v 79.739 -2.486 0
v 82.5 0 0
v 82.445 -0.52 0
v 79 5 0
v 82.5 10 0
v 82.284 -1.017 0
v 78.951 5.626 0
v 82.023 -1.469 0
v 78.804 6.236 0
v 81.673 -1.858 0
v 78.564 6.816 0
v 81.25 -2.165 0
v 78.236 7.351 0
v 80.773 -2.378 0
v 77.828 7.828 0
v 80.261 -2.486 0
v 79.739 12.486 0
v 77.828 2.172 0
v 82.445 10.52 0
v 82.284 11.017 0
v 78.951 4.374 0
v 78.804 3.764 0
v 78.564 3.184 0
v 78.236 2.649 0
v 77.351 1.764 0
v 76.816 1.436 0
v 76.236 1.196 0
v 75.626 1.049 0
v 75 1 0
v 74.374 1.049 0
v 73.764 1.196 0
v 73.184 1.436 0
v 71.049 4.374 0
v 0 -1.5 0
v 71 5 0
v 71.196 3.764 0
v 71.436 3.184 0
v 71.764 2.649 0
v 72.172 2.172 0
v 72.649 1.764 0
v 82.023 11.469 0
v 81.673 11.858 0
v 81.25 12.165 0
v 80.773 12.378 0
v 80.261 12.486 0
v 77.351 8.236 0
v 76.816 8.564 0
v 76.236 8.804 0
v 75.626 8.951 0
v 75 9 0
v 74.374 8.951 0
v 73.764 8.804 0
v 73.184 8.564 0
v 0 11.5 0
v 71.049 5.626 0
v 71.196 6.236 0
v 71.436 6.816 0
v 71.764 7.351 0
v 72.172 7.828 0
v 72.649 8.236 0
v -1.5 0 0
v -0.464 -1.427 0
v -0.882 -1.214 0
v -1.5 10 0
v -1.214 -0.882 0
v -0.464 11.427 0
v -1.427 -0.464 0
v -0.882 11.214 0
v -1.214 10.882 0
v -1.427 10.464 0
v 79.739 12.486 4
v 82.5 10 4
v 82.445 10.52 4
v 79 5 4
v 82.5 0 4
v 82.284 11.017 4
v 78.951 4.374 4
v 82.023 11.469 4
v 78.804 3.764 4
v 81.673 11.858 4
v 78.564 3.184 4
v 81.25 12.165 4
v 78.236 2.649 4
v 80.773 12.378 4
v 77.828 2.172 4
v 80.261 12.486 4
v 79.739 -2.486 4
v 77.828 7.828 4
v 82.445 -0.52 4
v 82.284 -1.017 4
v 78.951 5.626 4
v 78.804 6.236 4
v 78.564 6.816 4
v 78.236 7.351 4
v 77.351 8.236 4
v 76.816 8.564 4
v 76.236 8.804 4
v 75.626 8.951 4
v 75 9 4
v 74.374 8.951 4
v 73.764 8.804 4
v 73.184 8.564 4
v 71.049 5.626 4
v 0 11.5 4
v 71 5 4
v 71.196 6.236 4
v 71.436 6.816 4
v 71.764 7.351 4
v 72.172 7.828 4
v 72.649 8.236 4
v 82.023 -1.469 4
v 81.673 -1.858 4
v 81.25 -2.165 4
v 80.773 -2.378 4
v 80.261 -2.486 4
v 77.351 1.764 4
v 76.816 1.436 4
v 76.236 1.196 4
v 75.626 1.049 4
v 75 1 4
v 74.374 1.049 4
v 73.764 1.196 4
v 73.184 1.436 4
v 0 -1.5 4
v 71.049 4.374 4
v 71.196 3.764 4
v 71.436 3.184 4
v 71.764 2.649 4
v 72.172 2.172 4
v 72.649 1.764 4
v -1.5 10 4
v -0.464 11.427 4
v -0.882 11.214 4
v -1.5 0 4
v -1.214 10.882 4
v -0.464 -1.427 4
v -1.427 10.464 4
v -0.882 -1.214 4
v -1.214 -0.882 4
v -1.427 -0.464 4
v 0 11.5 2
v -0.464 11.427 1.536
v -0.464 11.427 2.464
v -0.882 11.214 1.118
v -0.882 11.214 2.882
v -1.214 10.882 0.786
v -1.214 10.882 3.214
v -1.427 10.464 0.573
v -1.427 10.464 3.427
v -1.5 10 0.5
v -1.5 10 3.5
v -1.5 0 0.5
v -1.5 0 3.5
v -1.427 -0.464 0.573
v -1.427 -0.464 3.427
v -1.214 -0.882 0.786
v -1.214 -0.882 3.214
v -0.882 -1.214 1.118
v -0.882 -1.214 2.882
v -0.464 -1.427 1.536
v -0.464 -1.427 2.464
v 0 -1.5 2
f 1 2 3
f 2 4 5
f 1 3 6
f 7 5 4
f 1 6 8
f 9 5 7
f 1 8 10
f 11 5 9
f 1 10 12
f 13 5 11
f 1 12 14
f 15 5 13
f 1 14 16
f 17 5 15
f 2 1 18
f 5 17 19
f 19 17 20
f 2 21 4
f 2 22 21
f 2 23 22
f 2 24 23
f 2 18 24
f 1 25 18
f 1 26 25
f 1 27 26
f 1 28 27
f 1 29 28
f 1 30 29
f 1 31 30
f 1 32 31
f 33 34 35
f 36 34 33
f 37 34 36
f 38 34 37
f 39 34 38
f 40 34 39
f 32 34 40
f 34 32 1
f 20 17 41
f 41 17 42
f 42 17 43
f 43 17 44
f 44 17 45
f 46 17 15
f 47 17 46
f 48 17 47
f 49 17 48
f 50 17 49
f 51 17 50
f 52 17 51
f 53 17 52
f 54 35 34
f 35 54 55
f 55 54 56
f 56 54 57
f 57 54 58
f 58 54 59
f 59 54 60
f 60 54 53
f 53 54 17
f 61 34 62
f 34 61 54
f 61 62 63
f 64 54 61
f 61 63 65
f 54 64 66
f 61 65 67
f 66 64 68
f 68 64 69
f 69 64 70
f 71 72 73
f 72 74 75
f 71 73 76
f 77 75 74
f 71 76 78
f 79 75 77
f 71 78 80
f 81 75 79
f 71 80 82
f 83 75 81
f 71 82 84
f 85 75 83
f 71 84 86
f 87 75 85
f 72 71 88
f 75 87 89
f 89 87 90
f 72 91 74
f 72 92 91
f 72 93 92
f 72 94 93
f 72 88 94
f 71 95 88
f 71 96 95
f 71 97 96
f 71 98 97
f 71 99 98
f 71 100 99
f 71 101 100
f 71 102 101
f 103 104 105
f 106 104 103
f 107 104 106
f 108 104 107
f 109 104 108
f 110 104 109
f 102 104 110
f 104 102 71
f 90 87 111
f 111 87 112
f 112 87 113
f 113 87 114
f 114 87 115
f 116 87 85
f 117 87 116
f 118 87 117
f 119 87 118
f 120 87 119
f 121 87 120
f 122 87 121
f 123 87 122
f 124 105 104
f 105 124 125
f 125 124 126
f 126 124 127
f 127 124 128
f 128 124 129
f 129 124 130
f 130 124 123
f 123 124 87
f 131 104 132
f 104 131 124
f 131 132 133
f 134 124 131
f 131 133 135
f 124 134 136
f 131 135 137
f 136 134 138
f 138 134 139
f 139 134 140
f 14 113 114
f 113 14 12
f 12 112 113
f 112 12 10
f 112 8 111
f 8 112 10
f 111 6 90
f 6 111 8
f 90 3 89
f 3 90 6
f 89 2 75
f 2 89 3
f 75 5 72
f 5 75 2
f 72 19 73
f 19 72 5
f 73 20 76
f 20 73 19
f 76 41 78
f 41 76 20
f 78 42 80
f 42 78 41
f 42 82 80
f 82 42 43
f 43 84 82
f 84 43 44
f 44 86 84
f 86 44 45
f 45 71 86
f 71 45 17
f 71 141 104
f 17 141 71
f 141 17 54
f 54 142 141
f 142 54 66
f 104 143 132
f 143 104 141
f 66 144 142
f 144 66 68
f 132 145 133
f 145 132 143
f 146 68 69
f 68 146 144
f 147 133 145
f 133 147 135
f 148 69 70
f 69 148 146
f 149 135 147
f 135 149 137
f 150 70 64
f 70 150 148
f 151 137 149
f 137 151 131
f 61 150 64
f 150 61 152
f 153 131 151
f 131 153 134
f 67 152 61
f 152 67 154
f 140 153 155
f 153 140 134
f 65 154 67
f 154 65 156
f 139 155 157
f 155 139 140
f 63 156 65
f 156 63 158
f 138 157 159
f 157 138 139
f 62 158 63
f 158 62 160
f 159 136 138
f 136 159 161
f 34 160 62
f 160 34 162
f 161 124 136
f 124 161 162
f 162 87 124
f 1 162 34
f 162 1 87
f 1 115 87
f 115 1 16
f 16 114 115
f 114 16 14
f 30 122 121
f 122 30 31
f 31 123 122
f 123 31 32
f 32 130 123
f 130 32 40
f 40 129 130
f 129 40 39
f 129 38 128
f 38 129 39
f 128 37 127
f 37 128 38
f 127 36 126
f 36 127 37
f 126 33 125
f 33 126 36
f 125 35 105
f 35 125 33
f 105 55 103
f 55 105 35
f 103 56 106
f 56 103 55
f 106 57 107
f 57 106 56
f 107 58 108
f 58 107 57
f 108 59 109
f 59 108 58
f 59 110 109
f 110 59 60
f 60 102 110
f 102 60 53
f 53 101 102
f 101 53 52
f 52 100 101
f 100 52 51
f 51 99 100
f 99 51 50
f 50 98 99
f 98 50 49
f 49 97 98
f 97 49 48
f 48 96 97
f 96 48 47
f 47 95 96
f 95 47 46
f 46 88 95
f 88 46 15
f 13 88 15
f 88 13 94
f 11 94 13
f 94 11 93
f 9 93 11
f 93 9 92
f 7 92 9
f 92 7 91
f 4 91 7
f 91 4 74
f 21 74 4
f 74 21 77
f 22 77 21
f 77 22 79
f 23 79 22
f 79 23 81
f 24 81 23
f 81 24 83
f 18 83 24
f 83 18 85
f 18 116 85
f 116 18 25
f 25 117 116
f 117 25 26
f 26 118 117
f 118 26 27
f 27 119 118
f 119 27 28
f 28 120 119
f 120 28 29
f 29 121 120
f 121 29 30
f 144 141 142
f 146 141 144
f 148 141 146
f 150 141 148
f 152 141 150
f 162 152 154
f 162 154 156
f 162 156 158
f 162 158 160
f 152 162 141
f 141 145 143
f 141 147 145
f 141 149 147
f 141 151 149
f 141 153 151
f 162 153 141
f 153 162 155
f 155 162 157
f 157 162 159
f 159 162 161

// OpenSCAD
difference() {
  linear_extrude(4) difference() {
    hull(){
      circle(d=3,$fn=20);
      translate([0,10]) circle(d=3,$fn=20);
      translate([80,0]) circle(d=5,$fn=30);
      translate([80,10]) circle(d=5,$fn=30);
    }
    translate([75,5]) circle(d=8,$fn=40);
  }
  translate([0,-5,2]) rotate([0,-45-90]) cube(20);
}
